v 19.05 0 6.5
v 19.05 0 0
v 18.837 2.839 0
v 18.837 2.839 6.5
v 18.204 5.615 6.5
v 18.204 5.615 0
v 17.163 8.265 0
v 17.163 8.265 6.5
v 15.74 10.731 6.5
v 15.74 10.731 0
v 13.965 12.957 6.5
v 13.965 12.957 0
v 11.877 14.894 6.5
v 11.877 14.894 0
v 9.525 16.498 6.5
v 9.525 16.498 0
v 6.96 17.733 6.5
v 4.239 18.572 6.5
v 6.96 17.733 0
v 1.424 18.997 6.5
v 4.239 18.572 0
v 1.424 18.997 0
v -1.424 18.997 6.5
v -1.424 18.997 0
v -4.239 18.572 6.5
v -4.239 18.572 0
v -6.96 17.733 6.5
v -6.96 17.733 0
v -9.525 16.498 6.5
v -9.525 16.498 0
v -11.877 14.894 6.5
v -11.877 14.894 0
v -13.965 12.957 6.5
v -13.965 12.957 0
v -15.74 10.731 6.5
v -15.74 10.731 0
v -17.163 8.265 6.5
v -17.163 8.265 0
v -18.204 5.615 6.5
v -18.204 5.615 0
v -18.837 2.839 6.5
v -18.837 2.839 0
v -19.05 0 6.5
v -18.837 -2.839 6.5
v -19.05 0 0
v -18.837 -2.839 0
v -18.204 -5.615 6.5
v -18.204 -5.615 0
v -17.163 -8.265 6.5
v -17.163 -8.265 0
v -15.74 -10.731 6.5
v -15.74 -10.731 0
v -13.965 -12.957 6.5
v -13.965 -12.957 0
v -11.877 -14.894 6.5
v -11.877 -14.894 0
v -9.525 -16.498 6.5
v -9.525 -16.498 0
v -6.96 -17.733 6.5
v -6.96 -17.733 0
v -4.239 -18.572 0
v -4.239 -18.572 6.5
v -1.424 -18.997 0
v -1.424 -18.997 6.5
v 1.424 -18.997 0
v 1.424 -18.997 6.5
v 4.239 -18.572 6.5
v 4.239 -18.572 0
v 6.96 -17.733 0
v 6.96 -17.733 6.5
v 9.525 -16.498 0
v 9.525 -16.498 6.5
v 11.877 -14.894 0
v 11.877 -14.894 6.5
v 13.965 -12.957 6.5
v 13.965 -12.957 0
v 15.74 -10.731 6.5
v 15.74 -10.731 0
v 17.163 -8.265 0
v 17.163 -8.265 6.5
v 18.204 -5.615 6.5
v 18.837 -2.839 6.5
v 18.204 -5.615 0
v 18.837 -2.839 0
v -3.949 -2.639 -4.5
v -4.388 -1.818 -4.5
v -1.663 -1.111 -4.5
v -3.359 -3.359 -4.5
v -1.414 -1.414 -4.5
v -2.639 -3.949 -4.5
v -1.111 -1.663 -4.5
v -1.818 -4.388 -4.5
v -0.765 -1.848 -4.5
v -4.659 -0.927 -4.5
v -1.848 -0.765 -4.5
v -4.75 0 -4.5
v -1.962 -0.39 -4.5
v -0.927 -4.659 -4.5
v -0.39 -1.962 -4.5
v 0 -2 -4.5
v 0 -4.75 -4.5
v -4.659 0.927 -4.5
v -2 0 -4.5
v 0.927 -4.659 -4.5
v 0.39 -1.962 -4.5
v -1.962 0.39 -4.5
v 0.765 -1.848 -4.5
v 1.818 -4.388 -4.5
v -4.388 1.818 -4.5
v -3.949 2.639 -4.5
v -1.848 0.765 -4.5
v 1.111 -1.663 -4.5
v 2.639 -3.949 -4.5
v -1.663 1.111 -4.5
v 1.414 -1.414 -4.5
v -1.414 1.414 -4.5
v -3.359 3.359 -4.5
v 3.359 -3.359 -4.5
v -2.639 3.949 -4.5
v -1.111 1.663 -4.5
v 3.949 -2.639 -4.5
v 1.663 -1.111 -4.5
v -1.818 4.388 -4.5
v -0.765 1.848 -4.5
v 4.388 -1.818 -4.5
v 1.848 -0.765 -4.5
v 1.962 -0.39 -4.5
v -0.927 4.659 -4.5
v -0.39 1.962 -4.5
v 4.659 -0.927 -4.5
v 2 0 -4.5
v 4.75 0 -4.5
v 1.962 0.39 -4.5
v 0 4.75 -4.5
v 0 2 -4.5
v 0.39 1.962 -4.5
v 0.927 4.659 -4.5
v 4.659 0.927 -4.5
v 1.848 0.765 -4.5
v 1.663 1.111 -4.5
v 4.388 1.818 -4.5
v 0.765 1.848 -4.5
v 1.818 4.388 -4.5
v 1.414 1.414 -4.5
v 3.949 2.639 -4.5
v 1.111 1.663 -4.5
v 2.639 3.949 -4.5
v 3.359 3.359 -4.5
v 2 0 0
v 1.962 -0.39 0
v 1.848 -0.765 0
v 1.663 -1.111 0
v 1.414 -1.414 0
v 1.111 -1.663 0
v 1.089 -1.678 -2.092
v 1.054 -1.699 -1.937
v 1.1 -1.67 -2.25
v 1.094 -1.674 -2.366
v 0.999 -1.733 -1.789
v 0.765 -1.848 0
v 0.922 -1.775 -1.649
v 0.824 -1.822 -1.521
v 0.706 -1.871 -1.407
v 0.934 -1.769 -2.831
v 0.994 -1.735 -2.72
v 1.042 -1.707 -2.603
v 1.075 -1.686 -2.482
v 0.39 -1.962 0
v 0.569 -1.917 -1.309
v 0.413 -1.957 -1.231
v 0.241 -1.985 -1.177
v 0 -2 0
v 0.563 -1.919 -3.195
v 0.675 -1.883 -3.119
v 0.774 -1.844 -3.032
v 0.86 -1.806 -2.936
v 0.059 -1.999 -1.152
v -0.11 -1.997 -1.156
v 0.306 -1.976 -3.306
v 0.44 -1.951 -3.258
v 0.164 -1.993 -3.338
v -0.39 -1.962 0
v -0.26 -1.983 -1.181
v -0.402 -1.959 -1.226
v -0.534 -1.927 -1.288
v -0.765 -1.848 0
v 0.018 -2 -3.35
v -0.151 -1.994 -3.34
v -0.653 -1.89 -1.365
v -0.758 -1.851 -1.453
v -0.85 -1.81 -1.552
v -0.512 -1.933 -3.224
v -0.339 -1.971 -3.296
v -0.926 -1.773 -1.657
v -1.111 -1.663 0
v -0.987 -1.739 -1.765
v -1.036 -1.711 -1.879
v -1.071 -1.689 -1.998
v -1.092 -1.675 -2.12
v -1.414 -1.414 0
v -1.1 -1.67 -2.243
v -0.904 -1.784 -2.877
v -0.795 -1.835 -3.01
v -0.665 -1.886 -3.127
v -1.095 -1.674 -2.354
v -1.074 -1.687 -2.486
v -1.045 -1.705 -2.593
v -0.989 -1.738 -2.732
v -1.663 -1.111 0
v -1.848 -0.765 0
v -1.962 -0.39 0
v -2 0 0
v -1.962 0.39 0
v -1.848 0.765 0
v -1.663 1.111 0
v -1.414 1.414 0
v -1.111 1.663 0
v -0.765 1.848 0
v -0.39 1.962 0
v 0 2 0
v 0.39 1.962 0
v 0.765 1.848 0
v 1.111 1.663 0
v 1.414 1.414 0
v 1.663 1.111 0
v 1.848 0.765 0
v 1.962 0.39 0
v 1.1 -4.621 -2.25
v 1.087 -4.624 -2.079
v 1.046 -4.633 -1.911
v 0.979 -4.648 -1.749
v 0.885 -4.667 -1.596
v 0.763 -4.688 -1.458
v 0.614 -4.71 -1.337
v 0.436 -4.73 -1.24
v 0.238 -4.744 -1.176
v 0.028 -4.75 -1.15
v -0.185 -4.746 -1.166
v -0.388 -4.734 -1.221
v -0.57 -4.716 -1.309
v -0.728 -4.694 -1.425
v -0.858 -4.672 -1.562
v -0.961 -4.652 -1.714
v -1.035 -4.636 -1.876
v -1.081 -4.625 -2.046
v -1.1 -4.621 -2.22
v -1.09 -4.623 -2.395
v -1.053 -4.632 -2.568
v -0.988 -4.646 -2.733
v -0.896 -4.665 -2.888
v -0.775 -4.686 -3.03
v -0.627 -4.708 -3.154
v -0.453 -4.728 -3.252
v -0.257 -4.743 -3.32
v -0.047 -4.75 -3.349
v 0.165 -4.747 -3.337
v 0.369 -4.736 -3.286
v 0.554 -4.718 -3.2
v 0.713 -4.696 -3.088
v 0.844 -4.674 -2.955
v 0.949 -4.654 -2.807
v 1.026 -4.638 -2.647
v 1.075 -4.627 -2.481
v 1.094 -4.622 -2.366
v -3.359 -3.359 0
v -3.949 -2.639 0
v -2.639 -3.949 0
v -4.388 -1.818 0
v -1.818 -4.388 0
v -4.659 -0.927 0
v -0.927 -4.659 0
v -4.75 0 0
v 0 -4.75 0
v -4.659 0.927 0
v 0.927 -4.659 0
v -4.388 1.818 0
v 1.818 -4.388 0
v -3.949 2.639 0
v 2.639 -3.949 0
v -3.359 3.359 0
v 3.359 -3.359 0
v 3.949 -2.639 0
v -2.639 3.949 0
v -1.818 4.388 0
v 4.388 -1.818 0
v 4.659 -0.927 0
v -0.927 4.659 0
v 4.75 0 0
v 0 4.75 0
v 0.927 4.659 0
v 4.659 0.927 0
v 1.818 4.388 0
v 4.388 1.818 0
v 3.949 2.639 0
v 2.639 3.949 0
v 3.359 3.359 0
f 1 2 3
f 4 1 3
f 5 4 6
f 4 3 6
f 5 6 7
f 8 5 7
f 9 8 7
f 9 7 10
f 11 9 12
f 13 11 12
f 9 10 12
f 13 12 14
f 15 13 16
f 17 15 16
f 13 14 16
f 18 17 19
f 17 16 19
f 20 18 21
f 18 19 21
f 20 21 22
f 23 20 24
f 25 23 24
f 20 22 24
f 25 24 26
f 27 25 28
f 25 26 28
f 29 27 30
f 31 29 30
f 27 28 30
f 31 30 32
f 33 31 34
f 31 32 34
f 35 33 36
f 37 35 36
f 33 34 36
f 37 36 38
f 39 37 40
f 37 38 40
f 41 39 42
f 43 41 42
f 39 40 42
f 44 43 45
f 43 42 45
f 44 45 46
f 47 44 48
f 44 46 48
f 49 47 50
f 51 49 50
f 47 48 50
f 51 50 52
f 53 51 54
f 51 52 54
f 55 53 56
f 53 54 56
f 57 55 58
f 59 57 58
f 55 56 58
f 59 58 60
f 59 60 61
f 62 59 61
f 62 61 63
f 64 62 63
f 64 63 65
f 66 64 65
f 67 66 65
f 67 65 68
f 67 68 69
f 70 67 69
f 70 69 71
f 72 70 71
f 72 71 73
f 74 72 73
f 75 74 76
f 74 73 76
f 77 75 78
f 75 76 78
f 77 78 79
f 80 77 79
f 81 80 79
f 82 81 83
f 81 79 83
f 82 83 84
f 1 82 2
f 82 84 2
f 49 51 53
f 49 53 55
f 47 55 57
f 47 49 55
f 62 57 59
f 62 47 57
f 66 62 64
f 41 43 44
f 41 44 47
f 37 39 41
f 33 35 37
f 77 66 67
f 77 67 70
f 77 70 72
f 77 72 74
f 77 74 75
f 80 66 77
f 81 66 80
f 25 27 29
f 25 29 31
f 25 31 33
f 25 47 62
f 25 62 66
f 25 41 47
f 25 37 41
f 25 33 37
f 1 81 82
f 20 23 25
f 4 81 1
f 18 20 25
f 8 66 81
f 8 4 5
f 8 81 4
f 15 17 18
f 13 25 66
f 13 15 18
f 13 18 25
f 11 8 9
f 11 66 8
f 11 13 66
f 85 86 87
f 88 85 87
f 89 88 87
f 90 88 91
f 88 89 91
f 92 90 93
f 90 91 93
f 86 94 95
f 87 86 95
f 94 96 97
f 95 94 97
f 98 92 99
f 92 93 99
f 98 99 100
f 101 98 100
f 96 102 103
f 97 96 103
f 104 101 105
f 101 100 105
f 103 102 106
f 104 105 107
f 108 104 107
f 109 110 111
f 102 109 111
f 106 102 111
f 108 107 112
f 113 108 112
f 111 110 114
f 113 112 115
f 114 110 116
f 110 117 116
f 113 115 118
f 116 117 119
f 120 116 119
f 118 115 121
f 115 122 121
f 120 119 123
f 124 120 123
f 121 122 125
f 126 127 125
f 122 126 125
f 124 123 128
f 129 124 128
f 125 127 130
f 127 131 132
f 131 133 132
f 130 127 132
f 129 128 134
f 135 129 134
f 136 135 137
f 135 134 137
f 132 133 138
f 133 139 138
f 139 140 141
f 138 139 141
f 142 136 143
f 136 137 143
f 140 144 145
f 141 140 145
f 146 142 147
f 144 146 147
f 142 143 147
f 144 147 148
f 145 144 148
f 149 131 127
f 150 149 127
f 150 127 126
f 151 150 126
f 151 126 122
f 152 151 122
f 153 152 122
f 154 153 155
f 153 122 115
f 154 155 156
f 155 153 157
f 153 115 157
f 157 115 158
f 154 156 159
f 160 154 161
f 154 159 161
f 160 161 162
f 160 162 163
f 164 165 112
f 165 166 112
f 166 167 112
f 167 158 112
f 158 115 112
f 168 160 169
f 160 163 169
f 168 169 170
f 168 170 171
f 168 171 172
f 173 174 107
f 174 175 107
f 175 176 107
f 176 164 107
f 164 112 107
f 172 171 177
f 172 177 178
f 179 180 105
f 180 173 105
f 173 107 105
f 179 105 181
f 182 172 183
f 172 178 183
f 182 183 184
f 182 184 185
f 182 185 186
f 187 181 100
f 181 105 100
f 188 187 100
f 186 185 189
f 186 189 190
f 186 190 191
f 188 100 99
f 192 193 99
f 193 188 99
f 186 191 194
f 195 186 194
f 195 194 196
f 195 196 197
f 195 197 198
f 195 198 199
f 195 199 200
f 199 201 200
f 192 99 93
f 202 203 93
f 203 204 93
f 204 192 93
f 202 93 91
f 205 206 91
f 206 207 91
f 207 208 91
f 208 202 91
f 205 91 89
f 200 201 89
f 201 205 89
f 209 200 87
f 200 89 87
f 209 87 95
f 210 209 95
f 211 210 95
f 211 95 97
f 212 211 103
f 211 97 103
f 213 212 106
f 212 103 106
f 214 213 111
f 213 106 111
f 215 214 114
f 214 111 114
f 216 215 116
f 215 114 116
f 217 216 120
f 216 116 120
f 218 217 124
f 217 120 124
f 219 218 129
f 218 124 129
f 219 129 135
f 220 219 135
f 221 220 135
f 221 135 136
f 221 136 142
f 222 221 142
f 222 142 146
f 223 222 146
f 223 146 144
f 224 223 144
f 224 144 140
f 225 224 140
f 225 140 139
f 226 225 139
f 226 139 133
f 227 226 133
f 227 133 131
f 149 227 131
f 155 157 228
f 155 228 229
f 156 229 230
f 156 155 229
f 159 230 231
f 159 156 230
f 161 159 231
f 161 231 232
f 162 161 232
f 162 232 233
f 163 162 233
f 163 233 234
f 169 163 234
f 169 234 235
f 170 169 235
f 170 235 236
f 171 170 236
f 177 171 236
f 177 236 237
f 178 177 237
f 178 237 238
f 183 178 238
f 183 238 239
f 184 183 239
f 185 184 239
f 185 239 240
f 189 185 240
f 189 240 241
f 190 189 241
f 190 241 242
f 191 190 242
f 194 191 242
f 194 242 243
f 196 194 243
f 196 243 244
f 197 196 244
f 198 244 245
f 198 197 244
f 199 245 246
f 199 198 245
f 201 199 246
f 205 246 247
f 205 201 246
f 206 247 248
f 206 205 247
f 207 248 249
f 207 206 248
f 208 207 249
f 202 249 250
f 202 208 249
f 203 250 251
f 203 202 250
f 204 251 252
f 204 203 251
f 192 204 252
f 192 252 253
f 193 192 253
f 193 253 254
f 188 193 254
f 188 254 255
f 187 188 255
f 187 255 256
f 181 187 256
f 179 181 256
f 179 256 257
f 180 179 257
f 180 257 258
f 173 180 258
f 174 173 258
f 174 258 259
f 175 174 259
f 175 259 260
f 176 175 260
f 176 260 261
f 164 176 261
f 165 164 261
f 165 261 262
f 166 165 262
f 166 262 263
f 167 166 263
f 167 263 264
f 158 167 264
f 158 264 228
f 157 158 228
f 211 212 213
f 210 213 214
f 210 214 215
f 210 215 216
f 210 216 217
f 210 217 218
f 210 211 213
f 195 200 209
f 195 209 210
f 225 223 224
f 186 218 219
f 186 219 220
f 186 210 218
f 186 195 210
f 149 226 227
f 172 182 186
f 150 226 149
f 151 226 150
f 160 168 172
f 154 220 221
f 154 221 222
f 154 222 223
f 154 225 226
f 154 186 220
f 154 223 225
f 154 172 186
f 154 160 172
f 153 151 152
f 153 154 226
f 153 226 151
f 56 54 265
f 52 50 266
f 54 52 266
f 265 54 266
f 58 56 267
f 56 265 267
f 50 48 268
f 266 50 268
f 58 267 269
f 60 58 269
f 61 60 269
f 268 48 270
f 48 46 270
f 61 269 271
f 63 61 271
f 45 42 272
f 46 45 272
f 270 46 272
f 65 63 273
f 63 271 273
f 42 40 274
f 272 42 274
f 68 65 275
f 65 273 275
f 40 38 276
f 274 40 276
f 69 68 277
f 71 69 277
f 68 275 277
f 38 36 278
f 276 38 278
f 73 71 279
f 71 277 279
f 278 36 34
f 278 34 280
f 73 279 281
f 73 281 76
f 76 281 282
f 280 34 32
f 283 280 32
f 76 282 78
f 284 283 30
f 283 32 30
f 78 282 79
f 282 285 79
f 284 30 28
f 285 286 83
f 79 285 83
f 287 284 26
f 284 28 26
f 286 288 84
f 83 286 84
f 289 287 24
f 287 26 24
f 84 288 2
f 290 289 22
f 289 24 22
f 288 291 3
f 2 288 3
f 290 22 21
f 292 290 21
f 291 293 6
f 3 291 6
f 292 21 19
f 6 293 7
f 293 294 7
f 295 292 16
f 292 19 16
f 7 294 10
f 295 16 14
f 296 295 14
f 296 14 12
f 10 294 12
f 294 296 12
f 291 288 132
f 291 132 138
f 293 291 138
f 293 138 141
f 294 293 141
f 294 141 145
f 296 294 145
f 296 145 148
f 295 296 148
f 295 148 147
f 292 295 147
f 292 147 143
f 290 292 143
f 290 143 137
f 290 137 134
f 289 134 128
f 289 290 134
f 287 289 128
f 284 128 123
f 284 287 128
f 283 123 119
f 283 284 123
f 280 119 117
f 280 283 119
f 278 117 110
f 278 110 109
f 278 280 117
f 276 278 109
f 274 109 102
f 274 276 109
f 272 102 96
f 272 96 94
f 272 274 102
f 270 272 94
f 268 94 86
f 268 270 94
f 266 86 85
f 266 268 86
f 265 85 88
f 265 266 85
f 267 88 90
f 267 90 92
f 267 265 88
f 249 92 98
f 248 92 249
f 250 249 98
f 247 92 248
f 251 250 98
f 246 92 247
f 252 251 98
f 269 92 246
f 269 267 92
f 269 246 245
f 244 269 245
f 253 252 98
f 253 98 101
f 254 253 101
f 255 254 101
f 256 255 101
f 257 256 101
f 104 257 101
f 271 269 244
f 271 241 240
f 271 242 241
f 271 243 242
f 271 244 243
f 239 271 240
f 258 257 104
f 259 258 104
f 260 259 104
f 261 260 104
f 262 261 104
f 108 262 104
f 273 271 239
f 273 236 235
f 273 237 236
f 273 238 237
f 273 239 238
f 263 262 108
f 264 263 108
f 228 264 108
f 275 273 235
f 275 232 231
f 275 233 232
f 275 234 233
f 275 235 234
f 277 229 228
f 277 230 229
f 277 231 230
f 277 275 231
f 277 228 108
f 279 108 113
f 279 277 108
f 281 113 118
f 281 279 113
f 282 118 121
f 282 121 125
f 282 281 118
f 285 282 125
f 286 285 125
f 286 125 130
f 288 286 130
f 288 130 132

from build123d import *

# Parameters (mm, degrees)
F0_R     = 19.05
F0_R_2   = 4.75
F1_DEPTH = 6.5
F2_DEPTH = 4.5
F3_R     = 2
F4_DEPTH = 4.5
F5_R     = 1.1
F6_DEPTH = 5


with BuildPart() as f1:
    # F0 (on Top) → F1 (new body)
    with BuildSketch(Plane.XY):
        Circle(F0_R)
        Circle(F0_R_2, mode=Mode.SUBTRACT)
        Circle(F0_R_2)
    extrude(amount=F1_DEPTH)

    # F0 (on Top) → F2 (join)
    with BuildSketch(Plane.XY):
        Circle(F0_R_2)
    extrude(amount=-F2_DEPTH)

    # F3 (on face) → F4 (cut)
    with BuildSketch(Plane(origin=(0, 0, -4.5), x_dir=(1, 0, 0), z_dir=(0, 0, -1))):
        Circle(F3_R)
    extrude(amount=-F4_DEPTH, mode=Mode.SUBTRACT)

    # F5 (on Front) → F6 (cut)
    with BuildSketch(Plane.XZ):
        with Locations((0, -2.25)):
            Circle(F5_R)
    extrude(amount=F6_DEPTH, mode=Mode.SUBTRACT)


solid = f1.part
